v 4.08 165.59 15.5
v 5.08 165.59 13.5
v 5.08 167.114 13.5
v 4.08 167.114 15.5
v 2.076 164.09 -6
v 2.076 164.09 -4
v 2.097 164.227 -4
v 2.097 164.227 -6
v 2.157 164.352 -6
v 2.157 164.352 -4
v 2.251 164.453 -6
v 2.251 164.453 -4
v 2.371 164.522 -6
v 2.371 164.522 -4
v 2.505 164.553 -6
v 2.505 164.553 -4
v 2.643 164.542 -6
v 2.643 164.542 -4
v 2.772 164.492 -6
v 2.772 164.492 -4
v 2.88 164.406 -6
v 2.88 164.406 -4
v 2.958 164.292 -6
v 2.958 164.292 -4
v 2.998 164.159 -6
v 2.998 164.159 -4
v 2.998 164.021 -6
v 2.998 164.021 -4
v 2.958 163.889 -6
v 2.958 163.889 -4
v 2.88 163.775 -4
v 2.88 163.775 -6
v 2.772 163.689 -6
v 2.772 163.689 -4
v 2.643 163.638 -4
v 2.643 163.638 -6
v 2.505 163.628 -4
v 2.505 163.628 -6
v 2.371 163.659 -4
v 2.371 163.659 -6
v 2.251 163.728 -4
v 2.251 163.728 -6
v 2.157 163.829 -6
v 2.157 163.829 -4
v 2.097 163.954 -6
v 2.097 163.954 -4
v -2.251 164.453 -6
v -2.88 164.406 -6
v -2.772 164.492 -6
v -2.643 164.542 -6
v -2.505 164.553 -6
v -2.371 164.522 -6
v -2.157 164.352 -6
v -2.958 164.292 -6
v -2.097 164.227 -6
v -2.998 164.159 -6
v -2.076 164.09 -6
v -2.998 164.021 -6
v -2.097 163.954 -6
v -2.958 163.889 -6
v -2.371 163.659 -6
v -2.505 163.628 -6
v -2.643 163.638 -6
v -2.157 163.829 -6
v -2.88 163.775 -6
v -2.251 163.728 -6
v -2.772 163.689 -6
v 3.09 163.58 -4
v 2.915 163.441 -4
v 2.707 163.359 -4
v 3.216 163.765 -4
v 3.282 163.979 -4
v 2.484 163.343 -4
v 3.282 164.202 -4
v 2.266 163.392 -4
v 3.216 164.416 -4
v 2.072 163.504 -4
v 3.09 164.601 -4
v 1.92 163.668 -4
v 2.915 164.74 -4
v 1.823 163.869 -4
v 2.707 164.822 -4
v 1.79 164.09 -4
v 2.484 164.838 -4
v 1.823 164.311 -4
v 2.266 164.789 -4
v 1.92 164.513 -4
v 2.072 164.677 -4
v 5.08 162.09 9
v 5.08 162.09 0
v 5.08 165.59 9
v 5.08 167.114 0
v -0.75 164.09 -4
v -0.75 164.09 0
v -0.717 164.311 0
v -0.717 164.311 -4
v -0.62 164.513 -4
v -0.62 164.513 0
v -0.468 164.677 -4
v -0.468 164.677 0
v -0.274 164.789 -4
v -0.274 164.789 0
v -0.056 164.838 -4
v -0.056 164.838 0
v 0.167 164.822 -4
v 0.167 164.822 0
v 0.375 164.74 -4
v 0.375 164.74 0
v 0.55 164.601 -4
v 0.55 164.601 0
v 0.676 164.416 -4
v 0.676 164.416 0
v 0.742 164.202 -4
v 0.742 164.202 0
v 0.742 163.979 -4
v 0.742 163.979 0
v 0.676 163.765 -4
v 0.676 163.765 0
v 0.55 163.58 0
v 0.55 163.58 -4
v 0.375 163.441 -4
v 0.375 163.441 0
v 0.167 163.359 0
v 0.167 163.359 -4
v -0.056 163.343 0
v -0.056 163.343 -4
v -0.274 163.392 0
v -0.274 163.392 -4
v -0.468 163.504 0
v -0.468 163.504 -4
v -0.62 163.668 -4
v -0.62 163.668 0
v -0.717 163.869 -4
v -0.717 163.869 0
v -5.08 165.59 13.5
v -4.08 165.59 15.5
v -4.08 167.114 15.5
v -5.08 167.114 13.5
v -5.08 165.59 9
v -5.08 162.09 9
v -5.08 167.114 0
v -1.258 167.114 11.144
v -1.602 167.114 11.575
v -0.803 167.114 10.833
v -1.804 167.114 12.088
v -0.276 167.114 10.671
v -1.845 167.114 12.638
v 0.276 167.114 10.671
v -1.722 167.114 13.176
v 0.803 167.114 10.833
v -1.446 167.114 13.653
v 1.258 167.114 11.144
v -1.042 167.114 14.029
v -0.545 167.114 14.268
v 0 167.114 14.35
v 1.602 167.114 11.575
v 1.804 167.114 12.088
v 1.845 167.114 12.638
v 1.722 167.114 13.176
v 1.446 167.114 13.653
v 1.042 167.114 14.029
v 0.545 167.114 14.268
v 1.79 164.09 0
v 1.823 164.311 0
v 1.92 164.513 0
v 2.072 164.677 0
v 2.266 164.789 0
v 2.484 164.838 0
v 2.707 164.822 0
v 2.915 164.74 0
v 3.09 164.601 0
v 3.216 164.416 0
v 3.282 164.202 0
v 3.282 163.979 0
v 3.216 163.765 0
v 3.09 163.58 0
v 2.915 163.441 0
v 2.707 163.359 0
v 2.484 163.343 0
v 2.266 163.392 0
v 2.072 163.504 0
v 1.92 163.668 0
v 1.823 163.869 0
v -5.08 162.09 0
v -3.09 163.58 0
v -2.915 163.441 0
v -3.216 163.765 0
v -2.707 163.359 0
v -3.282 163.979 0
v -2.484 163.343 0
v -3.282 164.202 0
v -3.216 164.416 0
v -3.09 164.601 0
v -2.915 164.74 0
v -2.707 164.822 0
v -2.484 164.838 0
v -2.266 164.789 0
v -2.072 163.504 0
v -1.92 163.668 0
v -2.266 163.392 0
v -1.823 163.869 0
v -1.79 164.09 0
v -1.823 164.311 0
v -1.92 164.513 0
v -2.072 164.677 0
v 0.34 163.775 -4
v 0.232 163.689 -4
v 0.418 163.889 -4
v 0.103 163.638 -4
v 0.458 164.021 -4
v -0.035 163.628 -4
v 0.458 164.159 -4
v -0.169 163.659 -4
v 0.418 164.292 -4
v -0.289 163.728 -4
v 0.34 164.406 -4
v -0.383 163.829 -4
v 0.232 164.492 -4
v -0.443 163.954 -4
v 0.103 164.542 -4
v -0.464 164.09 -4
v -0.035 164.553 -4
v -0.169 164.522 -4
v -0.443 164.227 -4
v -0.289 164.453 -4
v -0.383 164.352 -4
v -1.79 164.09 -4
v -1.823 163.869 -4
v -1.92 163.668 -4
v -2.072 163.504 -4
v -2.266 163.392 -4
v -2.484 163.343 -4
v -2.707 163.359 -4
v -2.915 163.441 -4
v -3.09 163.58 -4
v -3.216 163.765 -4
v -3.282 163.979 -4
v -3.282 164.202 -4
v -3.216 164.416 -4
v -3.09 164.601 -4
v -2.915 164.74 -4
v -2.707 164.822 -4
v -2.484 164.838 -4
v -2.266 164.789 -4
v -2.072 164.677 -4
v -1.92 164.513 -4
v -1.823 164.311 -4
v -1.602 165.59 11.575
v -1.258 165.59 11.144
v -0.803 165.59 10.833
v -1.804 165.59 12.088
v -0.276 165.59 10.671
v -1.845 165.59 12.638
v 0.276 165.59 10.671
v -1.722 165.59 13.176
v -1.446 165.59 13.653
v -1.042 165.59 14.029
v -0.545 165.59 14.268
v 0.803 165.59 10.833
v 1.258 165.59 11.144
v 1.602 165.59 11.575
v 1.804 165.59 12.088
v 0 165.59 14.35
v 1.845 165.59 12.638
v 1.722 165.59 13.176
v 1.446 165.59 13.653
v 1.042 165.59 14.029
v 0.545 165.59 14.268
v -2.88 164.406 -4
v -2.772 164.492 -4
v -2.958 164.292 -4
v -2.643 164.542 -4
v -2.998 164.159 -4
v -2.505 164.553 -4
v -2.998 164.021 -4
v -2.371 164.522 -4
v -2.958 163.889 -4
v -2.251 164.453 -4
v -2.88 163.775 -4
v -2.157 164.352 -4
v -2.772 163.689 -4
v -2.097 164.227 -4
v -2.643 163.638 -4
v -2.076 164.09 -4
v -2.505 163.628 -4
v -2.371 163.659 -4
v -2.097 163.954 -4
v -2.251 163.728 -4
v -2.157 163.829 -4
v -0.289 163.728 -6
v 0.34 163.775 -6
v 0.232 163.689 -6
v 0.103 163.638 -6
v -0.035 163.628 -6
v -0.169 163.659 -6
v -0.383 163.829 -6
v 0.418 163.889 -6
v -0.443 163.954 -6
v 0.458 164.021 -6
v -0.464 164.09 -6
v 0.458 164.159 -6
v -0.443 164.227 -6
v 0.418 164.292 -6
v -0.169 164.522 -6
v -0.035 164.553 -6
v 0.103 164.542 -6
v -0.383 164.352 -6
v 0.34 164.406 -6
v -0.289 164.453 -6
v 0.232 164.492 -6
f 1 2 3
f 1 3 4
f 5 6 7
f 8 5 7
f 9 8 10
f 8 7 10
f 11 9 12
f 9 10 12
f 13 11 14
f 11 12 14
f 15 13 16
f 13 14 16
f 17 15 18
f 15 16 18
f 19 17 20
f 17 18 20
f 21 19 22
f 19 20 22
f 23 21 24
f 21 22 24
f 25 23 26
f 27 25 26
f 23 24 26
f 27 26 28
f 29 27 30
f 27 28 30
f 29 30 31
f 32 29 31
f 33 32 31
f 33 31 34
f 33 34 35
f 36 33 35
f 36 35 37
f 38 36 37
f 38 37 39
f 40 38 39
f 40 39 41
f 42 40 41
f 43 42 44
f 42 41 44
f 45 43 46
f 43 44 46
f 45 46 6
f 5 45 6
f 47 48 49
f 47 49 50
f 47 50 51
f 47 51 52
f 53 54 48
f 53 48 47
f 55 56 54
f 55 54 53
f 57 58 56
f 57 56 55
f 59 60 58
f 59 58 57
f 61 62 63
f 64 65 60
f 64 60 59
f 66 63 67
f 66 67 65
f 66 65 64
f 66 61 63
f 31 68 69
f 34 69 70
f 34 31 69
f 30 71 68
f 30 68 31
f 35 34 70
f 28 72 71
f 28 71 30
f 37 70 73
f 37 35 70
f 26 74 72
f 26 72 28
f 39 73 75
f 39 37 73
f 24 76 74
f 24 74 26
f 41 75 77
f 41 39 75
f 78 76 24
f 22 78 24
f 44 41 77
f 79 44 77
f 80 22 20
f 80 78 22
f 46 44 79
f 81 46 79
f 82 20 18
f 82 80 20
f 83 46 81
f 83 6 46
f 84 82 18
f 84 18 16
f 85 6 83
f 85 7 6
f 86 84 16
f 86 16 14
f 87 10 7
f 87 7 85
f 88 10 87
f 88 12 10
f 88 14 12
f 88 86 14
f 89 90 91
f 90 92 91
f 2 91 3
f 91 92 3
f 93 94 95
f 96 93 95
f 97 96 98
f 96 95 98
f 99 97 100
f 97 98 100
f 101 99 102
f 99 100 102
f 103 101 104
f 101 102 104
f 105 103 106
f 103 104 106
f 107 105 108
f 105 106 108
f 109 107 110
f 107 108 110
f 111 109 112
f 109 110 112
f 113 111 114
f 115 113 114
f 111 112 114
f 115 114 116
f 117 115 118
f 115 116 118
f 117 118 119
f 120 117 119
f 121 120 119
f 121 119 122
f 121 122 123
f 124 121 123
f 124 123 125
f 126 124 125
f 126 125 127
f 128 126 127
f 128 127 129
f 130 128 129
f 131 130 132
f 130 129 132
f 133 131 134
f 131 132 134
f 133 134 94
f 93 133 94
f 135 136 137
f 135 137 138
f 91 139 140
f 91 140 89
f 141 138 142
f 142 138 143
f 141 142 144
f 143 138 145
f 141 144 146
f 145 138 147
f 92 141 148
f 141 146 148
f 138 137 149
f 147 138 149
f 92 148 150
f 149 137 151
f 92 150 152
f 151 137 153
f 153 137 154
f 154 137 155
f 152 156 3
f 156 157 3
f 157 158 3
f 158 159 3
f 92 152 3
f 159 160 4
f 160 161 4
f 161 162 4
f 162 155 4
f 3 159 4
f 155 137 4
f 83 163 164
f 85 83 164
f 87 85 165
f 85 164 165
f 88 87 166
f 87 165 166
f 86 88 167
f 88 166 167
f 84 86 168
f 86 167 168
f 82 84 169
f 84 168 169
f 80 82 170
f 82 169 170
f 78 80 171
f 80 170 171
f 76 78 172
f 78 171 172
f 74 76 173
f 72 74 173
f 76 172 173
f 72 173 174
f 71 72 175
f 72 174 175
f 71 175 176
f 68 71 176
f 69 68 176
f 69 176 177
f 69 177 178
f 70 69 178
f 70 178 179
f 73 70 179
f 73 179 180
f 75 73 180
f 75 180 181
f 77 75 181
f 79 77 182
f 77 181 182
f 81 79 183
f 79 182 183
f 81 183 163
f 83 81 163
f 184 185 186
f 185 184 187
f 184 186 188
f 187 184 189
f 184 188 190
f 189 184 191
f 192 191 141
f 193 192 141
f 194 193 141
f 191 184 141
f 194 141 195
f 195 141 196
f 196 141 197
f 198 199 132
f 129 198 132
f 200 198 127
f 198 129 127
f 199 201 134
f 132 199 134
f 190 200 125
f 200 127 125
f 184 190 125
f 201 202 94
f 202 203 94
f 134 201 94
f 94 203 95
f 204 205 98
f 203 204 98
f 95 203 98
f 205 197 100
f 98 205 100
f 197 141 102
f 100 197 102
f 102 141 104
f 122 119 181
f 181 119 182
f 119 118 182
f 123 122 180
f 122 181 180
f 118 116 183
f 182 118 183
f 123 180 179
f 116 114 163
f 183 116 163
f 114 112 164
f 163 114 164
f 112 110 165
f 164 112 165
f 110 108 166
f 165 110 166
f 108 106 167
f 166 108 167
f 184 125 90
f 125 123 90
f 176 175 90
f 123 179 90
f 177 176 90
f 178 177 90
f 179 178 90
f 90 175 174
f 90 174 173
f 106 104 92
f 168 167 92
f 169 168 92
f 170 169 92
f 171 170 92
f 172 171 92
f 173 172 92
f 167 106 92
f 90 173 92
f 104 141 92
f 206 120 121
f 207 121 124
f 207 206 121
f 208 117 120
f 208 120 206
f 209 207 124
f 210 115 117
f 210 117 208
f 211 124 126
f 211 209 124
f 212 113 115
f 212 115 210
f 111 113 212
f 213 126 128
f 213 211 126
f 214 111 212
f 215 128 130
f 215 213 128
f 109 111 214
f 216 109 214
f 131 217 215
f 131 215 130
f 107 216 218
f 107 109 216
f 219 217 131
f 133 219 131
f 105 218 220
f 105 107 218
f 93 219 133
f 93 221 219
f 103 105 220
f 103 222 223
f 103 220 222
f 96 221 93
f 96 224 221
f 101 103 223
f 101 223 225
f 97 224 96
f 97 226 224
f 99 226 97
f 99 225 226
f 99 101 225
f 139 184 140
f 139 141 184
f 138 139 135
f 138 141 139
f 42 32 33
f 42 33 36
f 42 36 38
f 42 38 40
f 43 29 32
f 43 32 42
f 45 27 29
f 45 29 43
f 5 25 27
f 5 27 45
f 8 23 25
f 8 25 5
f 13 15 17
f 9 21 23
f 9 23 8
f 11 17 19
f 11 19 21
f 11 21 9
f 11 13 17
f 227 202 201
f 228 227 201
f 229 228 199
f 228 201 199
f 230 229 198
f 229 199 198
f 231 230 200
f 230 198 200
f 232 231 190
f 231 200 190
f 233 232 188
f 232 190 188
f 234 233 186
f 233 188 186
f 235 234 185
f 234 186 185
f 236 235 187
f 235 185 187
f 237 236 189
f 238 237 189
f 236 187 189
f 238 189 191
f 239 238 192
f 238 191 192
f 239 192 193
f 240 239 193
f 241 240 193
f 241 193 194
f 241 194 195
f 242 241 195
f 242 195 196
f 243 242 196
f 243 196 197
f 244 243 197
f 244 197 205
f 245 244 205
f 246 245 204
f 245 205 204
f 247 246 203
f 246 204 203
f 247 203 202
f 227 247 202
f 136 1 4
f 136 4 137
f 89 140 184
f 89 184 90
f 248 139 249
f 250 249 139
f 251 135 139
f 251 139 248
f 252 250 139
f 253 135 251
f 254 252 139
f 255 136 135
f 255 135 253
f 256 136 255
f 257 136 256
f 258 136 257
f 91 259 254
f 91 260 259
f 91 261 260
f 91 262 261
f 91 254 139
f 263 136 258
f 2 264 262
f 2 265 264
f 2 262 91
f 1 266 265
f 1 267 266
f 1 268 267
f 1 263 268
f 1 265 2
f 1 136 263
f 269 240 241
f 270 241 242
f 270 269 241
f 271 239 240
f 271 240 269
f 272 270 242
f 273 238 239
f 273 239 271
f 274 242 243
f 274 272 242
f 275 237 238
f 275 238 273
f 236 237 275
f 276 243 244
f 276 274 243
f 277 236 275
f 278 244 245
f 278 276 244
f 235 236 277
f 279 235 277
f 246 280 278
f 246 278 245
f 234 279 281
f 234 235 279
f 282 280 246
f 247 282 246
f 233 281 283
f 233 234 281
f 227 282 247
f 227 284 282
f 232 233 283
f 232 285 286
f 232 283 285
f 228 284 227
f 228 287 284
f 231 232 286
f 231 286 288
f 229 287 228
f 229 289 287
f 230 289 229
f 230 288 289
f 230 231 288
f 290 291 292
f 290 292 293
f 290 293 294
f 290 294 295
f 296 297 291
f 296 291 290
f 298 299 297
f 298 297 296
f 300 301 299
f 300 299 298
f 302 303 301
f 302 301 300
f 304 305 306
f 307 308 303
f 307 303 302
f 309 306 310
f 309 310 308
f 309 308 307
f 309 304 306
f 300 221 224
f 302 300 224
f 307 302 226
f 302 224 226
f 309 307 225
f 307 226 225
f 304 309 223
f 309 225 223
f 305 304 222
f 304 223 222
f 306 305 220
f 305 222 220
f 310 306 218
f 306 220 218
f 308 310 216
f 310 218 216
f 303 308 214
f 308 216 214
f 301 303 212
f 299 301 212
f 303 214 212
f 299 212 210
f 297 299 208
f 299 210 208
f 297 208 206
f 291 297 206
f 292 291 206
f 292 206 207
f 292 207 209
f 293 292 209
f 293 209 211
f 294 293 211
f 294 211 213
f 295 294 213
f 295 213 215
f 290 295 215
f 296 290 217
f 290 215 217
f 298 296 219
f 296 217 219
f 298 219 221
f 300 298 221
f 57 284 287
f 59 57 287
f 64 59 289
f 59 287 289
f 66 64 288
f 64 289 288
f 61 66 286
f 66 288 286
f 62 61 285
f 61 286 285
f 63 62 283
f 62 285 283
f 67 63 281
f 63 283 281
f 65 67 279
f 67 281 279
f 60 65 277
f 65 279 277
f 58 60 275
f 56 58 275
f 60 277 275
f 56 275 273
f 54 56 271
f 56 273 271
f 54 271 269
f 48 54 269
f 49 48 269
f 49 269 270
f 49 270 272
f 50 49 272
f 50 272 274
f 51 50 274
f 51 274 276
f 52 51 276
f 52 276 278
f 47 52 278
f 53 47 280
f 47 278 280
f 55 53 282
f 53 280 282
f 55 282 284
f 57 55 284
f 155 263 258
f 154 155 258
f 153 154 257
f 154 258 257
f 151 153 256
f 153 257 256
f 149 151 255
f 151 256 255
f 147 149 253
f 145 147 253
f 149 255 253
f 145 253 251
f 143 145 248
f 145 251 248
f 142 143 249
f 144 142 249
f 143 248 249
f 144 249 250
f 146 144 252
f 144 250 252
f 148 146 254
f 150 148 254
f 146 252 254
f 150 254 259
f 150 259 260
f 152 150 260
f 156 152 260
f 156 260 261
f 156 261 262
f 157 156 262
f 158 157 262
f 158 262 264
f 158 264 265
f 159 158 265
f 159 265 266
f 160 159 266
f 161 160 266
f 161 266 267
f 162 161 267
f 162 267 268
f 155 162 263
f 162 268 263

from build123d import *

# Parameters (mm, degrees)
SKETCH1_R           = 1.85
BOSS_EXTRUDE1_DEPTH = 1.524
SKETCH2_W           = 10.16
SKETCH2_H           = 9
BOSS_EXTRUDE2_DEPTH = 3.5
SKETCH3_R           = 0.75
BOSS_EXTRUDE3_DEPTH = 4
SKETCH6_R           = 0.46355
BOSS_EXTRUDE6_DEPTH = 2


with BuildPart() as part:
    # Sketch1 → Boss-Extrude1 (new body)
    with BuildSketch(Plane.XZ.offset(-165.590407598)):
        Polygon((-4.08, 15.5), (-5.08, 13.5), (-5.08, 0), (5.08, 0), (5.08, 13.5), (4.08, 15.5), align=None)
        with Locations(Location((0, 12.5, 0), (0, 0, 90))):
            Circle(SKETCH1_R, mode=Mode.SUBTRACT)
    extrude(amount=-BOSS_EXTRUDE1_DEPTH)

    # Sketch2 → Boss-Extrude2 (add)
    with BuildSketch(Plane.XZ.offset(-165.590407598)):
        with Locations((0, 4.5)):
            Rectangle(SKETCH2_W, SKETCH2_H)
    extrude(amount=BOSS_EXTRUDE2_DEPTH)

    # Sketch3 → Boss-Extrude3 (add)
    with BuildSketch(Plane(origin=(0, 0, 0), x_dir=(-1, 0, 0), z_dir=(0, 0, -1))):
        with Locations(Location((2.54, 164.090407598, 0), (0, 0, 180))):
            Circle(SKETCH3_R)
        with Locations((0, 164.090407598)):
            Circle(SKETCH3_R)
        with Locations((-2.54, 164.090407598)):
            Circle(SKETCH3_R)
    extrude(amount=BOSS_EXTRUDE3_DEPTH)

    # Sketch6 → Boss-Extrude6 (add)
    with BuildSketch(Plane(origin=(0, 0, -4), x_dir=(-1, 0, 0), z_dir=(0, 0, -1))):
        with Locations(Location((2.54, 164.090407598, 0), (0, 0, 180))):
            Circle(SKETCH6_R)
        with Locations((0, 164.090407598)):
            Circle(SKETCH6_R)
        with Locations((-2.54, 164.090407598)):
            Circle(SKETCH6_R)
    extrude(amount=BOSS_EXTRUDE6_DEPTH)


solid = part.part
